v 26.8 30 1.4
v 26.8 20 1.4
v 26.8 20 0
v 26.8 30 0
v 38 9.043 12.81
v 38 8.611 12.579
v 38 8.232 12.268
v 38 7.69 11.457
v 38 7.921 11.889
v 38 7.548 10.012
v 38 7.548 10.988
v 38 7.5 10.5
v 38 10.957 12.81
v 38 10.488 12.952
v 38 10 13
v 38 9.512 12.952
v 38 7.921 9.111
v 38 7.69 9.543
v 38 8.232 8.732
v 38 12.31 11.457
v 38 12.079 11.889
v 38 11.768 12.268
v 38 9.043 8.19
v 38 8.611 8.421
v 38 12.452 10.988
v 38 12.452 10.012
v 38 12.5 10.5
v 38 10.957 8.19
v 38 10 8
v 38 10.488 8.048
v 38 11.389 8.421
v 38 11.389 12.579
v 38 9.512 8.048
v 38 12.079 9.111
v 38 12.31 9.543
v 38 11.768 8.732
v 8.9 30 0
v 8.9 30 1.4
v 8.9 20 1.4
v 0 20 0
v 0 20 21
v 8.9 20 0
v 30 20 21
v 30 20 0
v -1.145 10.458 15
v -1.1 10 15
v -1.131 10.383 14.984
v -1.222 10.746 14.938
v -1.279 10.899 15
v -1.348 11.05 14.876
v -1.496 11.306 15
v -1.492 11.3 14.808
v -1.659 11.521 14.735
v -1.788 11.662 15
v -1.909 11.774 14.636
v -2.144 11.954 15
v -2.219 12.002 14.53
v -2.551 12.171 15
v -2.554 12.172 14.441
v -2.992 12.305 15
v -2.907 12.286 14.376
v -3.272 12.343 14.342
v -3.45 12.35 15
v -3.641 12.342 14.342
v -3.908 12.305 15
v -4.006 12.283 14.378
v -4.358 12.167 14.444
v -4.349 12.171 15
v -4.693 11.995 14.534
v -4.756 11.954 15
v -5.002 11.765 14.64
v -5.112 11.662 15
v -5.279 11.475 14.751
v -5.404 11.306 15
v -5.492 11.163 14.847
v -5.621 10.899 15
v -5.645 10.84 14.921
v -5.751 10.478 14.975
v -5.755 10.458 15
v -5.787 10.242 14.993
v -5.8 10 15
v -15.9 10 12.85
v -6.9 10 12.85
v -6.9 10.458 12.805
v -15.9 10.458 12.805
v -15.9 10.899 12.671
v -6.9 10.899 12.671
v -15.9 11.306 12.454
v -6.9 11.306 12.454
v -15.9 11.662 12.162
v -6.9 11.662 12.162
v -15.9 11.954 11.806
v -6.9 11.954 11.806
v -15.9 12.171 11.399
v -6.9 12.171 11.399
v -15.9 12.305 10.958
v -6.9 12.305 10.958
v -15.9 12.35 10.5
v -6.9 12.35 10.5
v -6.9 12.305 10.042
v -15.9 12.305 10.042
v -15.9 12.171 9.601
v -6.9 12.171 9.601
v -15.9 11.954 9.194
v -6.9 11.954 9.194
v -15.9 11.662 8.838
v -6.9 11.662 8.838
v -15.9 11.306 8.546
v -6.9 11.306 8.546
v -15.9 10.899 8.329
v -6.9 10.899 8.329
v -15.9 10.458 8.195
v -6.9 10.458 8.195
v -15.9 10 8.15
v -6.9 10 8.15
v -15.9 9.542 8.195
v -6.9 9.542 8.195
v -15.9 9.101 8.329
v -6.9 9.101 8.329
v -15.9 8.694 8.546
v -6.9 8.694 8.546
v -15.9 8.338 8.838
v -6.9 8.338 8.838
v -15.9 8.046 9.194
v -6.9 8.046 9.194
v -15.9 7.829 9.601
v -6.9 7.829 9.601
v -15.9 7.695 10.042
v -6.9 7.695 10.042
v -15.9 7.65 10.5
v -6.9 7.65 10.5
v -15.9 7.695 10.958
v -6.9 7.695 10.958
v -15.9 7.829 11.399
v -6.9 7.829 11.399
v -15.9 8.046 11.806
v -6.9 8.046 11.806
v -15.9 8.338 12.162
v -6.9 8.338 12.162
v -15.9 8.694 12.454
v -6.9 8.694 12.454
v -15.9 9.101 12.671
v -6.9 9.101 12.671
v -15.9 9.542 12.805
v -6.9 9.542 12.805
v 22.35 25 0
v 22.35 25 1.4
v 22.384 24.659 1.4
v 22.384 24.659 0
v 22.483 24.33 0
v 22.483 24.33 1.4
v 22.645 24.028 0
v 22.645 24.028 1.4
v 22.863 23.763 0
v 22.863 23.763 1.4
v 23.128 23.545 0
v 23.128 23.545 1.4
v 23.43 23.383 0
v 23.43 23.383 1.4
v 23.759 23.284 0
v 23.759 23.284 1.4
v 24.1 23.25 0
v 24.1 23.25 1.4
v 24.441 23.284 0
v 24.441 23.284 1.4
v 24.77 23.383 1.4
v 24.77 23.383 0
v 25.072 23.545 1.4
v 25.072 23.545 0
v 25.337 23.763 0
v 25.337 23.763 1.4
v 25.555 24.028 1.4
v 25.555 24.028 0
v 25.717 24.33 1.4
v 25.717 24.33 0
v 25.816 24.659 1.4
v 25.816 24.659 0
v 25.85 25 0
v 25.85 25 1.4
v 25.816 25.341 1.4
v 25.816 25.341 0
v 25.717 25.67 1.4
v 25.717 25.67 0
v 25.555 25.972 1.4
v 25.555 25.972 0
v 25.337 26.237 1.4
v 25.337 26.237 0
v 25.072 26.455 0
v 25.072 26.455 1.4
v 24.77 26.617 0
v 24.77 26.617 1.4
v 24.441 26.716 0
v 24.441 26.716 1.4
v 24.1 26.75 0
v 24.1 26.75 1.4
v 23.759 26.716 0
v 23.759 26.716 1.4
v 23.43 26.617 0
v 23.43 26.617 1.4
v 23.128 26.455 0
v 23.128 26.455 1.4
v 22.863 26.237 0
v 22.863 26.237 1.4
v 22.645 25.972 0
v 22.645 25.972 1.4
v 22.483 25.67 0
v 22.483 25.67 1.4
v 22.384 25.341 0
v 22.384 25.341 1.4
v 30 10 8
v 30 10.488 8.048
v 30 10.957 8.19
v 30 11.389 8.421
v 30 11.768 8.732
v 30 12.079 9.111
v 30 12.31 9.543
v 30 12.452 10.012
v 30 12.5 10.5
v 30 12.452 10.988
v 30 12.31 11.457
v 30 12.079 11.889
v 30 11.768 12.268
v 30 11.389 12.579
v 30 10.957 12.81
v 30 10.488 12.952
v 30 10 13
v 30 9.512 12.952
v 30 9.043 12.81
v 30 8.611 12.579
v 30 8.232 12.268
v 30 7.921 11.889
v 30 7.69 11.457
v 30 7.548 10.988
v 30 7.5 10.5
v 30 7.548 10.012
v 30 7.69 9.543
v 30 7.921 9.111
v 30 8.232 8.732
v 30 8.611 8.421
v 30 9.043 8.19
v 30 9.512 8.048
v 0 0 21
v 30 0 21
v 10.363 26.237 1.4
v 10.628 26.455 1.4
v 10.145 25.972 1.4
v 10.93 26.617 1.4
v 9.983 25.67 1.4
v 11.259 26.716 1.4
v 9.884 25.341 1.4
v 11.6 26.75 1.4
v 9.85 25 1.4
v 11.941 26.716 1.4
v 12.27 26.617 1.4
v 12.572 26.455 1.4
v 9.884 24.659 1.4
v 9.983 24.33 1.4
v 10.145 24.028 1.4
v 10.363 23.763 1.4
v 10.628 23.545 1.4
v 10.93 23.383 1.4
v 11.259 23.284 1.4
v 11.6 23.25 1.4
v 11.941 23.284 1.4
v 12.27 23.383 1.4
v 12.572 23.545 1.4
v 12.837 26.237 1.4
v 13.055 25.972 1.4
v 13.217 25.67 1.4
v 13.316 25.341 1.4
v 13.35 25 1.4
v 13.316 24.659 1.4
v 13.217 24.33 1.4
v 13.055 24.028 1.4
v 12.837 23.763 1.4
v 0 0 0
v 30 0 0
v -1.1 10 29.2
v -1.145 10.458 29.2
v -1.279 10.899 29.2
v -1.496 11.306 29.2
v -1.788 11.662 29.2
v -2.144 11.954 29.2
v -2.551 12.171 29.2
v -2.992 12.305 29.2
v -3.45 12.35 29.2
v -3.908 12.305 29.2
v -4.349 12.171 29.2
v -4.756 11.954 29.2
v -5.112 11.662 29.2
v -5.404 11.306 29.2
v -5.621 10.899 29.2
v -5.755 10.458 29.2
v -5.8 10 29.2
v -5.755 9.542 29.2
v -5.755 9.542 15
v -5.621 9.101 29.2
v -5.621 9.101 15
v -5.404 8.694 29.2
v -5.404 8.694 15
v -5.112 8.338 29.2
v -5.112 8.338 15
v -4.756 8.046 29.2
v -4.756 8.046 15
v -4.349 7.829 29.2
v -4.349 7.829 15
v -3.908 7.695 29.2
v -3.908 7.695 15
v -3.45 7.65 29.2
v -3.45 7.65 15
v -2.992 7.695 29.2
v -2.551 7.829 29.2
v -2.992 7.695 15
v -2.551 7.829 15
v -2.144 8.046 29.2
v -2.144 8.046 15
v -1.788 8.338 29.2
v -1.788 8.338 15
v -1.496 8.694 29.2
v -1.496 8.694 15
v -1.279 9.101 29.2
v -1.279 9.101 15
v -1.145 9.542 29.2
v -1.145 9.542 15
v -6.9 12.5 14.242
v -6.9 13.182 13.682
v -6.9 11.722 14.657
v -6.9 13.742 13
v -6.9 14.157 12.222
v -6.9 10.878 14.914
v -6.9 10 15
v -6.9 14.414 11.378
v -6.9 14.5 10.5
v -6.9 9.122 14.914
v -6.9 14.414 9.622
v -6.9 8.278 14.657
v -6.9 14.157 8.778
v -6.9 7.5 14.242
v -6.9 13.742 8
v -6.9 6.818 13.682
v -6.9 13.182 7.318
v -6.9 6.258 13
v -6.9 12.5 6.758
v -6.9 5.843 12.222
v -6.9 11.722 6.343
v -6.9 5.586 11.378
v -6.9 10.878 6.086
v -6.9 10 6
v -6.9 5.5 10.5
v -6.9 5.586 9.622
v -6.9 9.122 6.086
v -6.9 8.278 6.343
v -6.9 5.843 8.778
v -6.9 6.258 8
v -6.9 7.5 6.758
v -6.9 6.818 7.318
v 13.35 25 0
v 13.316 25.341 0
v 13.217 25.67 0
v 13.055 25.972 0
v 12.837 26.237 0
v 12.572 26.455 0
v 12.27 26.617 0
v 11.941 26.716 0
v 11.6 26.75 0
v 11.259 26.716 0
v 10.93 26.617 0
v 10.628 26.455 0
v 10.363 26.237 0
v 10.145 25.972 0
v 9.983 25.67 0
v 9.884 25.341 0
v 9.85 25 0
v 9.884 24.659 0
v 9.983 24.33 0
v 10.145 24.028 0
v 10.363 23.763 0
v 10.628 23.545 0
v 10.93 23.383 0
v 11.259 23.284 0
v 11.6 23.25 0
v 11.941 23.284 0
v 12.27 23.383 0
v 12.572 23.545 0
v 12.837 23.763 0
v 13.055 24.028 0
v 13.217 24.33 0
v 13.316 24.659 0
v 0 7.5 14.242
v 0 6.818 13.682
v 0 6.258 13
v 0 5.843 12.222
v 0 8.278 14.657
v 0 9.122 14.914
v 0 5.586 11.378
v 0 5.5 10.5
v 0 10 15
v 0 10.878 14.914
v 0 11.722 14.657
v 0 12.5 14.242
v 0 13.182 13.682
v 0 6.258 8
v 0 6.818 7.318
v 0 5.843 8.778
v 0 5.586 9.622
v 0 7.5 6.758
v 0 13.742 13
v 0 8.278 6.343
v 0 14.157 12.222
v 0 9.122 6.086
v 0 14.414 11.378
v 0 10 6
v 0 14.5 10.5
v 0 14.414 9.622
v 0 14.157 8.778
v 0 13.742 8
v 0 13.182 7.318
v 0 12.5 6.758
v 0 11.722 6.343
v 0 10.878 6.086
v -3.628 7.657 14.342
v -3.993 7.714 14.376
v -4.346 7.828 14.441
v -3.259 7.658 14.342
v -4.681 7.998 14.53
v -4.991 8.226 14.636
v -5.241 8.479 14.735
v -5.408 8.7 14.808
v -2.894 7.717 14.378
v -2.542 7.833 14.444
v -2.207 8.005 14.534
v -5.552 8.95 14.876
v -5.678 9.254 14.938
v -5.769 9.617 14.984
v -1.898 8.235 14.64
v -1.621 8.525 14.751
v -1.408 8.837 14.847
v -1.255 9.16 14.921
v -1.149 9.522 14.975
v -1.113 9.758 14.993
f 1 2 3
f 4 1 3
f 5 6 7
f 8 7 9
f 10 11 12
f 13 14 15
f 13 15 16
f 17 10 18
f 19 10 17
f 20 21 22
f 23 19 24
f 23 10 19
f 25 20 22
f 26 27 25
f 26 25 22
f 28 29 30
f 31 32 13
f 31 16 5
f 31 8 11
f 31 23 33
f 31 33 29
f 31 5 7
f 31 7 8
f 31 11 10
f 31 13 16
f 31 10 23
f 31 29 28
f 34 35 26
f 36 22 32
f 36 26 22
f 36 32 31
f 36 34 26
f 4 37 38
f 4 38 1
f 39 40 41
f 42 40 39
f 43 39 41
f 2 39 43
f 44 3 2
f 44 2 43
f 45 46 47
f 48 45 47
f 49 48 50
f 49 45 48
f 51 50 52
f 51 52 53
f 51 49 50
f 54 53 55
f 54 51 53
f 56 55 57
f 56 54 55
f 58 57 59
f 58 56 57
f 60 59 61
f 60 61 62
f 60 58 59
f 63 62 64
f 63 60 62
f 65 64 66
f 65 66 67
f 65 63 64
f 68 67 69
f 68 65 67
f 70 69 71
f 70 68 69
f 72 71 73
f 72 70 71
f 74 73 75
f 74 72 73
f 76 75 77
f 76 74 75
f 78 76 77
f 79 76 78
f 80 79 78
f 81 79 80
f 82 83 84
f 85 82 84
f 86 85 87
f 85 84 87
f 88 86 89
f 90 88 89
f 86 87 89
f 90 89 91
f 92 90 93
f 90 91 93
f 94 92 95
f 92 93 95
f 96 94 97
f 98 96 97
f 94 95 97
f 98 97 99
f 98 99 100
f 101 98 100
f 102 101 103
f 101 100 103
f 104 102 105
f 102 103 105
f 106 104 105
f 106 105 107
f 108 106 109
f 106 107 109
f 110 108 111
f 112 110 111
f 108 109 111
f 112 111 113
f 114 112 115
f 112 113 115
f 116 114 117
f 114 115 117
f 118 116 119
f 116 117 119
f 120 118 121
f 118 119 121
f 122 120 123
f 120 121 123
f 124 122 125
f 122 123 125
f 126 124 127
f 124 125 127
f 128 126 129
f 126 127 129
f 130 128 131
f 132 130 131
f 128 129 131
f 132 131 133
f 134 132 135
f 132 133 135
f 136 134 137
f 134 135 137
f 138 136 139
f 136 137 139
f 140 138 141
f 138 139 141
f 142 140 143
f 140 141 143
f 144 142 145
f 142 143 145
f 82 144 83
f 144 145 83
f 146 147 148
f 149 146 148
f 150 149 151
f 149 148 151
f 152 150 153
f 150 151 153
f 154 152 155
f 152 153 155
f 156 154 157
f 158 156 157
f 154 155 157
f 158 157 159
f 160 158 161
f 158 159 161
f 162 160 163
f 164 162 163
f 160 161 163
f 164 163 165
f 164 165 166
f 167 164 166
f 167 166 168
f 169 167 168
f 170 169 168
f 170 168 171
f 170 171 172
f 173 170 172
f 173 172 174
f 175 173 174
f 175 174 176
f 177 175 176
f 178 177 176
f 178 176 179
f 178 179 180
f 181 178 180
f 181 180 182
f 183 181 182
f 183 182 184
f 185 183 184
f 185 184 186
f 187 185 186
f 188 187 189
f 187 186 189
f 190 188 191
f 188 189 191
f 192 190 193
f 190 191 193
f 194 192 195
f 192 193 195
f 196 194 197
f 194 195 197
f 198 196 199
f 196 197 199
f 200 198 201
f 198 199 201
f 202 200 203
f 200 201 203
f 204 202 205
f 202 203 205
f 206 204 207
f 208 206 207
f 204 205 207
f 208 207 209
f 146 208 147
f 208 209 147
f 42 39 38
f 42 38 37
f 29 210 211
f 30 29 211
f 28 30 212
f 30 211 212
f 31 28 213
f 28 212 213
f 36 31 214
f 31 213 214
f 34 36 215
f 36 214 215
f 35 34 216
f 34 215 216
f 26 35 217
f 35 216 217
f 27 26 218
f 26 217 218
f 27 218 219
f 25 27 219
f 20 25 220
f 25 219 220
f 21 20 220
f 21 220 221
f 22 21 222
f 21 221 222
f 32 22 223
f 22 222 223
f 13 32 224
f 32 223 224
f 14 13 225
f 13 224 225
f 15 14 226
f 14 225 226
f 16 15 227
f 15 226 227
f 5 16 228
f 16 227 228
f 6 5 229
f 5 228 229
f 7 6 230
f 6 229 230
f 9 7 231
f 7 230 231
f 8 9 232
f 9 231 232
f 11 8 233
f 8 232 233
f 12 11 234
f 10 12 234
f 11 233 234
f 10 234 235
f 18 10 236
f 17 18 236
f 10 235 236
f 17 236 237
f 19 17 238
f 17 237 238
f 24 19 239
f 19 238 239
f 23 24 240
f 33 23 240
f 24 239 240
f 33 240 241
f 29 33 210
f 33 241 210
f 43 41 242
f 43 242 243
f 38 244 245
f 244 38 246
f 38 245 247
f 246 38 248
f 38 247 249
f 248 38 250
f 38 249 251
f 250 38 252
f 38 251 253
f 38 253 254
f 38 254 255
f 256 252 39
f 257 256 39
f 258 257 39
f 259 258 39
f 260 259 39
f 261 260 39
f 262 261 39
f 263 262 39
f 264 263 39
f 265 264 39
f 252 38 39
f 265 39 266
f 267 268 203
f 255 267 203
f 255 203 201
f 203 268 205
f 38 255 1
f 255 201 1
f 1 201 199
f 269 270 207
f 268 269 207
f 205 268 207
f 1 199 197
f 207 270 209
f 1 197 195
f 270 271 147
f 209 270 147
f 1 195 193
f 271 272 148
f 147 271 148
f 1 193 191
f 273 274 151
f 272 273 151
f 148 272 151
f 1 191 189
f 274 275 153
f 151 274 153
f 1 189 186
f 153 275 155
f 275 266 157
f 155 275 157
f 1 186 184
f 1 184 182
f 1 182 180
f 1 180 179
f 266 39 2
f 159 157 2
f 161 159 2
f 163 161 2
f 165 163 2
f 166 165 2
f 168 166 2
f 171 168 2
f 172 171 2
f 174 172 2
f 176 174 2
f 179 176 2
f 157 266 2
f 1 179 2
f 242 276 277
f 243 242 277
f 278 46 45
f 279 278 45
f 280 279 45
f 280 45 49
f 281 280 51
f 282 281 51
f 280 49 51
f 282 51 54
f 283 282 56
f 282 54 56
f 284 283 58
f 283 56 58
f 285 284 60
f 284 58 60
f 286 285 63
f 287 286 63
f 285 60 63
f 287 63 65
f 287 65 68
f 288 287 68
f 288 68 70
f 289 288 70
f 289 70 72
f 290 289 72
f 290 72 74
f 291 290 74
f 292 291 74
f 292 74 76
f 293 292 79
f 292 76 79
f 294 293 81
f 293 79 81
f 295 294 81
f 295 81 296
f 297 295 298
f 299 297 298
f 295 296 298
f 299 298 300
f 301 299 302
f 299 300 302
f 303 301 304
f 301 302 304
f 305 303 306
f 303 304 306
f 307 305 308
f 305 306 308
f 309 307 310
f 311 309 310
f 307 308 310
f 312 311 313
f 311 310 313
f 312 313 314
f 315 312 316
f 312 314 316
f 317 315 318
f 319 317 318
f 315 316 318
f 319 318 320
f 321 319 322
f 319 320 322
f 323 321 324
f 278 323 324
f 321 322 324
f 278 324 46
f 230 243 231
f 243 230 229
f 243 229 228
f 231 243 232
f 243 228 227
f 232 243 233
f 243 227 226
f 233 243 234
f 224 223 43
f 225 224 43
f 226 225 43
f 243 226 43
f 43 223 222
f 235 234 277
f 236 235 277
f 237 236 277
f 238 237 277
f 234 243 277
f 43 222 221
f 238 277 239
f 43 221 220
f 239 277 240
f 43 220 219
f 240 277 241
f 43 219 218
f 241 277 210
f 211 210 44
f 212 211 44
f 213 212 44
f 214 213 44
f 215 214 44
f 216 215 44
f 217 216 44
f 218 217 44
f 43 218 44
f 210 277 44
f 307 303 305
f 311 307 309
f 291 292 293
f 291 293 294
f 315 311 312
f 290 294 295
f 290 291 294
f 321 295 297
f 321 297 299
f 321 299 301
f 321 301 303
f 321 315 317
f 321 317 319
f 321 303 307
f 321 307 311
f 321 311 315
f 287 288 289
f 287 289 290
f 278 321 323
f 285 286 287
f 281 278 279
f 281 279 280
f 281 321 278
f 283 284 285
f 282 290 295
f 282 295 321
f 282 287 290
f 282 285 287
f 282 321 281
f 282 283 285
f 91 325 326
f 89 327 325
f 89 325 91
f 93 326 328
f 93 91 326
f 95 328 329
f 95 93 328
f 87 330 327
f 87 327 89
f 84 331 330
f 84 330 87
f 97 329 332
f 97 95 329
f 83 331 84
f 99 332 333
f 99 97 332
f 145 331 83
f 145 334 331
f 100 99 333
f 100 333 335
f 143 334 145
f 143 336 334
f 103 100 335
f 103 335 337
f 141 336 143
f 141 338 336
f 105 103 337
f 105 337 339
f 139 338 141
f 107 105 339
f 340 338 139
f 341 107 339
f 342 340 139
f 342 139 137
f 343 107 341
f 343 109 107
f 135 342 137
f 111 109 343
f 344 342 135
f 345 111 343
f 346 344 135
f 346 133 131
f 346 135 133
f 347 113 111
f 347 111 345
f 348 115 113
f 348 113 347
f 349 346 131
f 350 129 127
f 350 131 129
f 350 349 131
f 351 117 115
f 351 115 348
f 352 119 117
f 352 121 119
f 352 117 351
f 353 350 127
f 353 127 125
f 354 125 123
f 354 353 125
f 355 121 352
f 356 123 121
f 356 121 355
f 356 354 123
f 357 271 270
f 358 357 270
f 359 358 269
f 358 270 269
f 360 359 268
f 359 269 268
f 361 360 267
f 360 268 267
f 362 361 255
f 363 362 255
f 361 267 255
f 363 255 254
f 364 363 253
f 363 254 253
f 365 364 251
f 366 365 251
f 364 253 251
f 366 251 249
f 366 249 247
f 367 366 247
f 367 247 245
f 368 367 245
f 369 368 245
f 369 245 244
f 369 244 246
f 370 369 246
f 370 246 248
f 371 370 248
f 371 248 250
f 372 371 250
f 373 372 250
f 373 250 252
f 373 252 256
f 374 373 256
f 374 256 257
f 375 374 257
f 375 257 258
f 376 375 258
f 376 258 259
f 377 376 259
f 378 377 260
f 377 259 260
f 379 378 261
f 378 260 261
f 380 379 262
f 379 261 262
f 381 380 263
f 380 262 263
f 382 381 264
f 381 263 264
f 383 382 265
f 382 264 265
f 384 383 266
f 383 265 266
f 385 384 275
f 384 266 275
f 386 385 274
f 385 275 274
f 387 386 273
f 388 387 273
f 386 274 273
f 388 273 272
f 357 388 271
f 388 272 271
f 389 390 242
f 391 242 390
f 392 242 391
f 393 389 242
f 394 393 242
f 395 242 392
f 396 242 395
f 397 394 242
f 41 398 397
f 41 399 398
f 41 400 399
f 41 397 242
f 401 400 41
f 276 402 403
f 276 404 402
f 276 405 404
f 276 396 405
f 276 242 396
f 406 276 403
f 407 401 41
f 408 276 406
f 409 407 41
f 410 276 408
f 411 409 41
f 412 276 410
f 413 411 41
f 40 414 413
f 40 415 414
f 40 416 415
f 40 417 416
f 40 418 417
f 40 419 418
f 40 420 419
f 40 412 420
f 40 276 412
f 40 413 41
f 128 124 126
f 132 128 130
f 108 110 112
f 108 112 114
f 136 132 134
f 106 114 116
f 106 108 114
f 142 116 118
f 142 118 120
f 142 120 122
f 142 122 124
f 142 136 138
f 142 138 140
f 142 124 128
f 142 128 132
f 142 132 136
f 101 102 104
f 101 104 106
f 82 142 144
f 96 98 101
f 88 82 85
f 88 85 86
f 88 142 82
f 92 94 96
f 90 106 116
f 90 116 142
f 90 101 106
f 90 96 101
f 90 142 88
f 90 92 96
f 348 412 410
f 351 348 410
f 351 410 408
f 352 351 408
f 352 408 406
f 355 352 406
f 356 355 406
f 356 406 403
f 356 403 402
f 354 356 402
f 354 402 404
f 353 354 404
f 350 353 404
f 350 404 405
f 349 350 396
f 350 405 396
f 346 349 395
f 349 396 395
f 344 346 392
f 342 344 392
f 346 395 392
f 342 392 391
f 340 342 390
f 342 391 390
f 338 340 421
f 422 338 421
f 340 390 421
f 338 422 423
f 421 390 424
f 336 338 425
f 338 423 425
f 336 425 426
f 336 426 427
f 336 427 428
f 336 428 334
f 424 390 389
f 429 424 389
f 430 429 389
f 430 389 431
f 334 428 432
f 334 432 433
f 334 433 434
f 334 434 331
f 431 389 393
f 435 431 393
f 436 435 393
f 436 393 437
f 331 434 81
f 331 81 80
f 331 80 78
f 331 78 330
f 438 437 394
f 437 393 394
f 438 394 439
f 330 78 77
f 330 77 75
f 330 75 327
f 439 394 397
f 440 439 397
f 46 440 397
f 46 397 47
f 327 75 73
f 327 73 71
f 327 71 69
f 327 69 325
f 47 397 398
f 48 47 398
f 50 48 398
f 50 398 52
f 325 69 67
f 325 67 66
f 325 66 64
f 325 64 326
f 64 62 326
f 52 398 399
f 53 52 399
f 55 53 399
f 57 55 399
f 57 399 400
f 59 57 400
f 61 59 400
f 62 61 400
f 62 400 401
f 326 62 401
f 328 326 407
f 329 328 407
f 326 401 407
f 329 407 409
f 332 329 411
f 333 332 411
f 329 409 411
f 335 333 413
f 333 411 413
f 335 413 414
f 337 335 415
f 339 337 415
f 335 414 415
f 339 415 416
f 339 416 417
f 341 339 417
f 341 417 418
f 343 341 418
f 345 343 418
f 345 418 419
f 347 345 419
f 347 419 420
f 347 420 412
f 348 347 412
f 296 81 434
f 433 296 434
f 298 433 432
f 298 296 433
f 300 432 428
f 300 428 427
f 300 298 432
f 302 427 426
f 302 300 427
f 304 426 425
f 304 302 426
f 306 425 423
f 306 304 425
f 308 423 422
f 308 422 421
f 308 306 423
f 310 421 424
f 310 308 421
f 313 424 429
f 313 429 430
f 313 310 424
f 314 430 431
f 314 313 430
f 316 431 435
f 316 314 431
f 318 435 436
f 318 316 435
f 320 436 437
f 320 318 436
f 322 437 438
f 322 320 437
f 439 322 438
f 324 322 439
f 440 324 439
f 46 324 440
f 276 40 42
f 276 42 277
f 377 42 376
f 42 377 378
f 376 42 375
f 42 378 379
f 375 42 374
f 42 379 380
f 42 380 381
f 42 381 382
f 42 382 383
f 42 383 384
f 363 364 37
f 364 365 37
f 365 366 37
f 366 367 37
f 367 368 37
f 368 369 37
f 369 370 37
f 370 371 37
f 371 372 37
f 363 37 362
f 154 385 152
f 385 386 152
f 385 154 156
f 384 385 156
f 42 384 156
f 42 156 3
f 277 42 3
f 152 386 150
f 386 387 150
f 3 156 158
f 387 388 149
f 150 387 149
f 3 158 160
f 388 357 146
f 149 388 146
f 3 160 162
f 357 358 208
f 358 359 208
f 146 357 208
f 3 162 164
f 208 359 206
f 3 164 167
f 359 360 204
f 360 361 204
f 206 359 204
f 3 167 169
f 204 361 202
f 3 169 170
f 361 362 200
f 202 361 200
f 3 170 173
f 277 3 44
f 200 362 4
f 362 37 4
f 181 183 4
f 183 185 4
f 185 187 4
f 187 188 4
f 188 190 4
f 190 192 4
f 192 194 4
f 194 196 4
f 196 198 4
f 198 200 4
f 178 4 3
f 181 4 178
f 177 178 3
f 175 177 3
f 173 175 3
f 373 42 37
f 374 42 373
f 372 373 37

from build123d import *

# Parameters (mm, degrees)
SKETCH1_W                            = 30
SKETCH1_H                            = 20
BOSS_EXTRUDE1_DEPTH                  = 21
SKETCH2_W                            = 17.9
SKETCH2_H                            = 1.4
BOSS_EXTRUDE2_DEPTH                  = 10
SKETCH3_R                            = 2.5
BOSS_EXTRUDE3_DEPTH                  = 8
SKETCH4_R                            = 4.5
BOSS_EXTRUDE4_DEPTH                  = 6.9
SKETCH5_R                            = 2.35
BOSS_EXTRUDE5_DEPTH                  = 9
SKETCH7_R                            = 2.35
BOSS_EXTRUDE6_DEPTH                  = 14.2
BOSS_EXTRUDE6_DIRECTION_2_REACH      = 53.391
BOSS_EXTRUDE6_DIRECTION_2_END_RADIUS = 4.5
SKETCH8_2_R                          = 1.75
CUT_EXTRUDE1_DEPTH                   = 56.828666472
SKETCH8_R                            = 1.75
BOSS_EXTRUDE7_DEPTH                  = 27.8


with BuildPart() as part:
    # Sketch1 → Boss-Extrude1 (new body)
    with BuildSketch(Plane.XY):
        with Locations((15, 10)):
            Rectangle(SKETCH1_W, SKETCH1_H)
    extrude(amount=BOSS_EXTRUDE1_DEPTH)

    # Sketch2 → Boss-Extrude2 (add)
    with BuildSketch(Plane(origin=(0, 20, 0), x_dir=(1, 0, 0), z_dir=(0, 1, 0))):
        with Locations((17.85, -0.7)):
            Rectangle(SKETCH2_W, SKETCH2_H)
    extrude(amount=BOSS_EXTRUDE2_DEPTH)

    # Sketch3 → Boss-Extrude3 (add)
    with BuildSketch(Plane(origin=(30, 0, 0), x_dir=(0, 0, -1), z_dir=(1, 0, 0))):
        with Locations((-10.5, 10)):
            Circle(SKETCH3_R)
    extrude(amount=BOSS_EXTRUDE3_DEPTH)

    # Sketch4 → Boss-Extrude4 (add)
    with BuildSketch(Plane.ZY):
        with Locations(Location((10.5, 10, 0), (0, 0, 180))):
            Circle(SKETCH4_R)
    extrude(amount=BOSS_EXTRUDE4_DEPTH)

    # Sketch5 → Boss-Extrude5 (add)
    with BuildSketch(Plane.ZY.offset(6.9)):
        with Locations((10.5, 10)):
            Circle(SKETCH5_R)
    extrude(amount=BOSS_EXTRUDE5_DEPTH)

    # Sketch7 → Boss-Extrude6 (add)
    with BuildSketch(Plane(origin=(-6.9, 10, 15), x_dir=(1, 0, 0), z_dir=(0, 0, 1))):
        with Locations((3.45, 0)):
            Circle(SKETCH7_R)
    extrude(amount=BOSS_EXTRUDE6_DEPTH)

    # Boss-Extrude6 direction 2: up to this cylinder (the profile starts outside it)
    boss_extrude6_direction_2_end = Plane(origin=(-3.45, 10, 10.5), z_dir=(1, 0, 0)) * Cylinder(BOSS_EXTRUDE6_DIRECTION_2_END_RADIUS, 116.782, mode=Mode.PRIVATE)
    # Sketch7 → Boss-Extrude6 direction 2 (add, up to the surface)
    with BuildSketch(Plane(origin=(-6.9, 10, 15), x_dir=(1, 0, 0), z_dir=(0, 0, 1)), mode=Mode.PRIVATE) as boss_extrude6_direction_2_sk1:
        with Locations((3.45, 0)):
            Circle(SKETCH7_R)
    boss_extrude6_direction_2_tool1 = extrude(boss_extrude6_direction_2_sk1.sketch, amount=-BOSS_EXTRUDE6_DIRECTION_2_REACH, mode=Mode.PRIVATE) - boss_extrude6_direction_2_end
    add(boss_extrude6_direction_2_tool1.solids().sort_by_distance((-3.45, 10, 15))[0])
    add(boss_extrude6_direction_2_tool1.solids().sort_by_distance((-3.45, 10, 15))[1])

    # Sketch8<2> → Cut-Extrude1 (cut, through all)
    with BuildSketch(Plane.XY.offset(1.4)):
        with Locations((11.6, 25)):
            Circle(SKETCH8_2_R)
        with Locations(Location((24.1, 25, 0), (0, 0, 180))):
            Circle(SKETCH8_2_R)
    extrude(amount=-CUT_EXTRUDE1_DEPTH, mode=Mode.SUBTRACT)

    # Sketch8 → Boss-Extrude7 (add, through all)
    with BuildSketch(Plane.XY.offset(1.4)):
        with Locations((11.6, 25)):
            Circle(SKETCH8_R)
        with Locations(Location((24.1, 25, 0), (0, 0, 180))):
            Circle(SKETCH8_R)
    extrude(amount=BOSS_EXTRUDE7_DEPTH)


with BuildPart() as boss_extrude7_kept_piece:
    # of the separate pieces the step leaves, the one the design keeps (boss_extrude7_pieces_kept)
    add(part.part.solids().sort_by_distance((0, 0, 0))[0])


solid = boss_extrude7_kept_piece.part
